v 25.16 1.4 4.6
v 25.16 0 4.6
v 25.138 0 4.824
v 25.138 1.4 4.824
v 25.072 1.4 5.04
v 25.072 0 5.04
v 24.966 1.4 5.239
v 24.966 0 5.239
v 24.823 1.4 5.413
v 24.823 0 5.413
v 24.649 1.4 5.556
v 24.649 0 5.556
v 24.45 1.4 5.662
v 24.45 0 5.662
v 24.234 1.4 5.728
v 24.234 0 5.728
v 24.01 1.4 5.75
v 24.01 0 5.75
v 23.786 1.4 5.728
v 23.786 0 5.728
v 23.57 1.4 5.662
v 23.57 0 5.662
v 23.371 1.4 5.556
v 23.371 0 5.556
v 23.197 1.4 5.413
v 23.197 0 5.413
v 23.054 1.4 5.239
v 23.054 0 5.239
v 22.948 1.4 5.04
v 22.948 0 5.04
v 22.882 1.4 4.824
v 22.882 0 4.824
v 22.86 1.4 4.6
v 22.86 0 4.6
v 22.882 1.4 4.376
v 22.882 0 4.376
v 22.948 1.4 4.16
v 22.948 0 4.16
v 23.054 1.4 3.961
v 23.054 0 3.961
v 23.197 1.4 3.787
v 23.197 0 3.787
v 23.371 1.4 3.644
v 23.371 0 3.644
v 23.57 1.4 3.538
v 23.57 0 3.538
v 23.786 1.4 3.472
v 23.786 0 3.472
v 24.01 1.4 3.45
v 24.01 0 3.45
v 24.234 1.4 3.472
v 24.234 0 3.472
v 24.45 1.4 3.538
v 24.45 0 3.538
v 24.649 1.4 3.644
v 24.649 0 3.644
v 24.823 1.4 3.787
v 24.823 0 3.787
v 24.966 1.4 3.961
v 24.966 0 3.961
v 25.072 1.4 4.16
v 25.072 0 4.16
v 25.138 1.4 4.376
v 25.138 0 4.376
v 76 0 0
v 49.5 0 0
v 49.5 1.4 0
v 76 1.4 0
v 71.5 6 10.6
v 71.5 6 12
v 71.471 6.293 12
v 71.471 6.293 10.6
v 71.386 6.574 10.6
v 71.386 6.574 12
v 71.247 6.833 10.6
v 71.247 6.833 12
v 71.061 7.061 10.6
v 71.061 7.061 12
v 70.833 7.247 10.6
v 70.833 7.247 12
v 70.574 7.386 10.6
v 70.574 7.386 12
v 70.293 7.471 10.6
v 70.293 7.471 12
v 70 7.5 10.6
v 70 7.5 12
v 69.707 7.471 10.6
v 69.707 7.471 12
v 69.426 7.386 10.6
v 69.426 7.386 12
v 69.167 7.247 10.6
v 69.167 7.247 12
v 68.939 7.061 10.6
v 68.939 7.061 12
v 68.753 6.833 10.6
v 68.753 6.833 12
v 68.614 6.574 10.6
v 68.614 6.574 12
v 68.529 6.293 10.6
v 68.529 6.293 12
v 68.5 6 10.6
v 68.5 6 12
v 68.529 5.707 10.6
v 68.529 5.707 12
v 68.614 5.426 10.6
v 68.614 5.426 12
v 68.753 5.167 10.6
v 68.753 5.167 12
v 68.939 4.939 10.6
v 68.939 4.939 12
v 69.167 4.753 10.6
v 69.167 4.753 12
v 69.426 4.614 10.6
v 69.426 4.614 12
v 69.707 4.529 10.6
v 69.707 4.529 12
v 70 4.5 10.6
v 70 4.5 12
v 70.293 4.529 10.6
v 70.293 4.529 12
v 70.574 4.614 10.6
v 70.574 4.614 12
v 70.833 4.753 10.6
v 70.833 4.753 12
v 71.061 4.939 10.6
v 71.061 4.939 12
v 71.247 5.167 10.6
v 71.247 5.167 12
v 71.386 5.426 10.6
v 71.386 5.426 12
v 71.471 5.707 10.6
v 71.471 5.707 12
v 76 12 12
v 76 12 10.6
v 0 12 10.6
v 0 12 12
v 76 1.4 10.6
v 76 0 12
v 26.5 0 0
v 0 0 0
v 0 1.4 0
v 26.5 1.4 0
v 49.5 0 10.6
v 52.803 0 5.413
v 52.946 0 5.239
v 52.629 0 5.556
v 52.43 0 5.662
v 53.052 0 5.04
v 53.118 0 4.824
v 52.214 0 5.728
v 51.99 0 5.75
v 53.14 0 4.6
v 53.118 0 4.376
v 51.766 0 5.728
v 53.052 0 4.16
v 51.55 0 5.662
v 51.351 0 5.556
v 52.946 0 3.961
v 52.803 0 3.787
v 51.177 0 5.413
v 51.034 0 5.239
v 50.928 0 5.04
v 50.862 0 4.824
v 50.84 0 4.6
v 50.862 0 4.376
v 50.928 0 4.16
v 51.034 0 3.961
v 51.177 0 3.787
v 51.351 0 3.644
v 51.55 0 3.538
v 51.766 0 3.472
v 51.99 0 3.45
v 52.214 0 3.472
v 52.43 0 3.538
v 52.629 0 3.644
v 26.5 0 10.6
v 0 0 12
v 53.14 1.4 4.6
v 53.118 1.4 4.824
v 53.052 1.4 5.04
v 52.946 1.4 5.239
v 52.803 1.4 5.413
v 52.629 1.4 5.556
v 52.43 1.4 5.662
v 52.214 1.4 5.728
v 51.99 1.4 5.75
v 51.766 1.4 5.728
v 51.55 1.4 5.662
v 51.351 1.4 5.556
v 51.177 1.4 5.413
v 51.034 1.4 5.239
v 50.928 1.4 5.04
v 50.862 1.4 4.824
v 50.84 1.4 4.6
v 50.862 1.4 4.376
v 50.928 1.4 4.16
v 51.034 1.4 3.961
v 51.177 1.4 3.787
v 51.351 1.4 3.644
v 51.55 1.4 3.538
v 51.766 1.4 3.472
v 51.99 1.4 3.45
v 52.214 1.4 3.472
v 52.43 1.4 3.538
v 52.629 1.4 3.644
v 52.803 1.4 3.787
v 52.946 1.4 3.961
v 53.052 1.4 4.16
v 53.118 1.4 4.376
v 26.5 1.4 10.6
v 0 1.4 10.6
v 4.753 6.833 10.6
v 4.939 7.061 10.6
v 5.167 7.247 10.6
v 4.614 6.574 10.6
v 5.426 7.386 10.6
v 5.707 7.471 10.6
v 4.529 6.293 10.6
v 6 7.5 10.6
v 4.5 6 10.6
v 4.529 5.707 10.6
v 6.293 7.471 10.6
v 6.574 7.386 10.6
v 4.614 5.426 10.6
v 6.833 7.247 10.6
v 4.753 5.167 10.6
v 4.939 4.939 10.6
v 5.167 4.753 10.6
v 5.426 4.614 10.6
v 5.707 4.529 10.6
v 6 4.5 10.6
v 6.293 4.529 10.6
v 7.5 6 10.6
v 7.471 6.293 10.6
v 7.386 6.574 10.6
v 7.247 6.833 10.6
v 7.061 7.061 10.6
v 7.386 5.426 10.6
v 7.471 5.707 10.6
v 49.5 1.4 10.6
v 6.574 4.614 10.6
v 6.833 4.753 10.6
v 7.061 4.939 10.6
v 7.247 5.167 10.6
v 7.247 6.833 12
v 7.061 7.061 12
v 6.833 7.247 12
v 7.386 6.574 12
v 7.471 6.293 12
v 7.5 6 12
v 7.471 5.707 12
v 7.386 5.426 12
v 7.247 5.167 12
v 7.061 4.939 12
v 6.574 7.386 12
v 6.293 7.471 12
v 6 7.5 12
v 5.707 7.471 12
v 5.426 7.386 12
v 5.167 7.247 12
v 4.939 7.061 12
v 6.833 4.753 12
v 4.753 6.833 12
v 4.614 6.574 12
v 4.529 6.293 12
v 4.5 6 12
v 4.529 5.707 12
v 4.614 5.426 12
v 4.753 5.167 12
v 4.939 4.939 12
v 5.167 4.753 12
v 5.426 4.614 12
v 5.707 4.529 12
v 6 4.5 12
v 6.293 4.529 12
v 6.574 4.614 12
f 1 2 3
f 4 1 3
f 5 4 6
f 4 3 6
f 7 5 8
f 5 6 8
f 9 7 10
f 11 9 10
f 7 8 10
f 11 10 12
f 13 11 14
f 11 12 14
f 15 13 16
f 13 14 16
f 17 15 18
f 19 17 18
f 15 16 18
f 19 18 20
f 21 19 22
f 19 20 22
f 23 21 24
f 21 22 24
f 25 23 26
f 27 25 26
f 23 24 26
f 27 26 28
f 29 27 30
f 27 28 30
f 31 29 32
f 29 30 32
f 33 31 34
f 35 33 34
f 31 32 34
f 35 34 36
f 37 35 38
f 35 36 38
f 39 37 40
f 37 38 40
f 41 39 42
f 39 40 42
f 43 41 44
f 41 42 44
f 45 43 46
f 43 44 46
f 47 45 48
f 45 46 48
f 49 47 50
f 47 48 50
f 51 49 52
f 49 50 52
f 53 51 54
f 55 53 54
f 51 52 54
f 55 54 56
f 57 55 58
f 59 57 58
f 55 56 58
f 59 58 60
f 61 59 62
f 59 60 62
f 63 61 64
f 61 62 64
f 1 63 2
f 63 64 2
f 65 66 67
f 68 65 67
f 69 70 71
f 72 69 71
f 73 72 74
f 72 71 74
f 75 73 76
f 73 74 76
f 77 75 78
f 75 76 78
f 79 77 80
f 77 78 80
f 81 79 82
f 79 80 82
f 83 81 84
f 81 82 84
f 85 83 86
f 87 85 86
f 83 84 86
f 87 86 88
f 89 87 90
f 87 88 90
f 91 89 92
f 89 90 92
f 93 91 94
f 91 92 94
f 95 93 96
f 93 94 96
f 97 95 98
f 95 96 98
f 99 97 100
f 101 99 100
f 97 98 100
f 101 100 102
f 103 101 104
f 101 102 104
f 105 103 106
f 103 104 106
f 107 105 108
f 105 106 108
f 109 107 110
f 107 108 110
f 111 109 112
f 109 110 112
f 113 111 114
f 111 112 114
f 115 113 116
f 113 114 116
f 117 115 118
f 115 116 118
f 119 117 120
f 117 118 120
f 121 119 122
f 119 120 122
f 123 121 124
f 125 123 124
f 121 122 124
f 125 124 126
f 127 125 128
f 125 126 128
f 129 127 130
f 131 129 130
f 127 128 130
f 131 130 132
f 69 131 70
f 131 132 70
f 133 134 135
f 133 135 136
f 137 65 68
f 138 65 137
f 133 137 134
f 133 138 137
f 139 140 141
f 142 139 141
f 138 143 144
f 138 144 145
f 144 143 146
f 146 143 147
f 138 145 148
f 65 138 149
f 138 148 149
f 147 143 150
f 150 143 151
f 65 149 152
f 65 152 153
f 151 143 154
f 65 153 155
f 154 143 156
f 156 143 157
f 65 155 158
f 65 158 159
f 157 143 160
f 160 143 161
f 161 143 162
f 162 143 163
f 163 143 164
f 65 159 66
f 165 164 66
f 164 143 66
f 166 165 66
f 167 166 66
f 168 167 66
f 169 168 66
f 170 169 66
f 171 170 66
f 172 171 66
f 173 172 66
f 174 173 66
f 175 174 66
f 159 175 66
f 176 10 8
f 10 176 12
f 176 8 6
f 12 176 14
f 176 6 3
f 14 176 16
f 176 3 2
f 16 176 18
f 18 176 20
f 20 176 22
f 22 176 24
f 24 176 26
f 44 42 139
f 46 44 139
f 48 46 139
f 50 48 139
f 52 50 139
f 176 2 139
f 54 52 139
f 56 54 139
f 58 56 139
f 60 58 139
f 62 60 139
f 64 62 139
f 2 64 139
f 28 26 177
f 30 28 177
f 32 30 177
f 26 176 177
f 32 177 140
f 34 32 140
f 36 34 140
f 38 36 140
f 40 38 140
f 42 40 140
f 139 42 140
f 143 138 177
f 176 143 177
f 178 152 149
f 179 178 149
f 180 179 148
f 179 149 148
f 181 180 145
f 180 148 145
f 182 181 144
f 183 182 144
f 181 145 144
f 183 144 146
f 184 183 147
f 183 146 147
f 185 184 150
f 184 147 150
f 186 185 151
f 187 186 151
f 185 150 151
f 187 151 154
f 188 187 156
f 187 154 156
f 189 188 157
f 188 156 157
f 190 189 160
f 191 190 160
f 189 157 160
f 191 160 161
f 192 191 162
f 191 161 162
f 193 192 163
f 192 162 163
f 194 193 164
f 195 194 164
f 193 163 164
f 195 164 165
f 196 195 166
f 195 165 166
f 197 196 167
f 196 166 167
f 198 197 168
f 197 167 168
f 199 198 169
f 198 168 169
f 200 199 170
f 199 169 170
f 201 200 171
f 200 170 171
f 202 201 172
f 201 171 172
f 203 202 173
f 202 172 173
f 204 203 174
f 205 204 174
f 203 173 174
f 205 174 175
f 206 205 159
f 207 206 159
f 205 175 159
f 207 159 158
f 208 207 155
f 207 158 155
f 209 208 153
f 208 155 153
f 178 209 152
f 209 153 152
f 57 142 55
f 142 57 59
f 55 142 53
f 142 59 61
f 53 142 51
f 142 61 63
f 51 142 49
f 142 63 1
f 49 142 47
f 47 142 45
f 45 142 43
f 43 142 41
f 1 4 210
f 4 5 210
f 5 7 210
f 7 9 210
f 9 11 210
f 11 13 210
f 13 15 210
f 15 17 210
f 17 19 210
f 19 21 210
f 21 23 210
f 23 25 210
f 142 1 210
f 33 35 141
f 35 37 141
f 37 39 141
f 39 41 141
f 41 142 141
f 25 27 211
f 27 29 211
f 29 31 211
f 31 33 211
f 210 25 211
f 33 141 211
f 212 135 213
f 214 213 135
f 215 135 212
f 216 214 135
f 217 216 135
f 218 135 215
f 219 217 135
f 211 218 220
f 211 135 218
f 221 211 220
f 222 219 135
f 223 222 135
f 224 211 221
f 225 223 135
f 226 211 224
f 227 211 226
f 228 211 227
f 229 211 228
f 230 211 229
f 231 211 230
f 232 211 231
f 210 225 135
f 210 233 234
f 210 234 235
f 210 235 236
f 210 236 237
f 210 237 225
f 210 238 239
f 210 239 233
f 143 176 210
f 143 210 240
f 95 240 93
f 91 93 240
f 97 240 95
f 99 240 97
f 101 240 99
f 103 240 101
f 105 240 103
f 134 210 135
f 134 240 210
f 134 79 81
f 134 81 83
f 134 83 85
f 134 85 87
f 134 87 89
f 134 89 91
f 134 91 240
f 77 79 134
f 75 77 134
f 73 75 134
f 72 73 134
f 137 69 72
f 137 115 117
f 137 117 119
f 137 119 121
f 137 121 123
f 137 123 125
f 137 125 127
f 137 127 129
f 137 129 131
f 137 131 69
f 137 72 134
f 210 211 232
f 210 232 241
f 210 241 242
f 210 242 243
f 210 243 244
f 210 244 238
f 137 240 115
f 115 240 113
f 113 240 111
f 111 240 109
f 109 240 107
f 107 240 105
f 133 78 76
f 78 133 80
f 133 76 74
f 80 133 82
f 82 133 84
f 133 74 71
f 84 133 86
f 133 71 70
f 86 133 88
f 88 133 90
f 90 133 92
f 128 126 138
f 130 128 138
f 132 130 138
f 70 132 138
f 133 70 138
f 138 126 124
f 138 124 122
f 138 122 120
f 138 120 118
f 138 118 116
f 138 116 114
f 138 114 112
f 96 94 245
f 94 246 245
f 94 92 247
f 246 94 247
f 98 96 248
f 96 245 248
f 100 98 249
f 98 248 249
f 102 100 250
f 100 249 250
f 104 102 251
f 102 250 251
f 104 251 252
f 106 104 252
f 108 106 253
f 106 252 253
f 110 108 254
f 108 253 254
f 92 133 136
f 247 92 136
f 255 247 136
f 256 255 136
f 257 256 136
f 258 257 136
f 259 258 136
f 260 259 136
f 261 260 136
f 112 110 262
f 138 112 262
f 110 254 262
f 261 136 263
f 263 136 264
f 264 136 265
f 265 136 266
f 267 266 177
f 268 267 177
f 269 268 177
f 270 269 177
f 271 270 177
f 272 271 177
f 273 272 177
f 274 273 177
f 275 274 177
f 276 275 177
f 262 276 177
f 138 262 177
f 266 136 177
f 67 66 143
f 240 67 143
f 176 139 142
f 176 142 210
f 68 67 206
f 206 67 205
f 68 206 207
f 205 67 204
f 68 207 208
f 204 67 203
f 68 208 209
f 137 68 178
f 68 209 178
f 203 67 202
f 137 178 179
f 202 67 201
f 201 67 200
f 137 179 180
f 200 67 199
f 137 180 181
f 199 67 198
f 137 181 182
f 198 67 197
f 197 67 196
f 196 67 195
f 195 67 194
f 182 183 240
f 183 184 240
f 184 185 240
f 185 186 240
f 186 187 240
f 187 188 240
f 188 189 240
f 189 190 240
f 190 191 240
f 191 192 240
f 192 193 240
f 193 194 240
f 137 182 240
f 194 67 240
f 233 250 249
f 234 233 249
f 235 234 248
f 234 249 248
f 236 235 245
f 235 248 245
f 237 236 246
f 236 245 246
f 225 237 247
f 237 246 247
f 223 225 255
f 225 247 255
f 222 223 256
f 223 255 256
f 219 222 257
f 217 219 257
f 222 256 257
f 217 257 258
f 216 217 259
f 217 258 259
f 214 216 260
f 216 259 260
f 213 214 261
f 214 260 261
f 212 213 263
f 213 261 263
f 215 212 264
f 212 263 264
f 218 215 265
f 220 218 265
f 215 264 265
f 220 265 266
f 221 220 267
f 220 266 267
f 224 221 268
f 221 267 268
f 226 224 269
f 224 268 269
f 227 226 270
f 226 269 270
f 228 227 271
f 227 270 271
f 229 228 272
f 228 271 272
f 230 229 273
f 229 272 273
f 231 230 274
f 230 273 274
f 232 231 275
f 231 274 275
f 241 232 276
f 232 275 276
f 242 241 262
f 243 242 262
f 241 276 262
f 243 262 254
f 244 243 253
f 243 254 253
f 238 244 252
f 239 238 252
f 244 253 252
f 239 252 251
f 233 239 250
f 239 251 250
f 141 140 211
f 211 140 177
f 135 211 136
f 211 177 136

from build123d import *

# Parameters (mm, degrees)
F1_DEPTH = 76
F2_W     = 23
F2_H     = 10.6
F2_R     = 1.15
F3_DEPTH = 1.4
F4_R     = 1.5
F5_DEPTH = 1.4


with BuildPart() as f1:
    # F0 (on Right) → F1 (new body)
    with BuildSketch(Plane.YZ):
        Polygon((0, 12), (0, 0), (1.4, 0), (1.4, 10.6), (12, 10.6), (12, 12), align=None)
    extrude(amount=F1_DEPTH)

    # F2 (on face) → F3 (cut, through all)
    with BuildSketch(Plane.XZ):
        with Locations((38, 5.3)):
            Rectangle(F2_W, F2_H)
        with Locations((24.01, 4.6)):
            Circle(F2_R)
        with Locations((51.99, 4.6)):
            Circle(F2_R)
    extrude(amount=-F3_DEPTH, mode=Mode.SUBTRACT)

    # F4 (on face) → F5 (cut, through all)
    with BuildSketch(Plane.XY.offset(12)):
        with Locations((6, 6)):
            Circle(F4_R)
        with Locations((70, 6)):
            Circle(F4_R)
    extrude(amount=-F5_DEPTH, mode=Mode.SUBTRACT)


solid = f1.part
